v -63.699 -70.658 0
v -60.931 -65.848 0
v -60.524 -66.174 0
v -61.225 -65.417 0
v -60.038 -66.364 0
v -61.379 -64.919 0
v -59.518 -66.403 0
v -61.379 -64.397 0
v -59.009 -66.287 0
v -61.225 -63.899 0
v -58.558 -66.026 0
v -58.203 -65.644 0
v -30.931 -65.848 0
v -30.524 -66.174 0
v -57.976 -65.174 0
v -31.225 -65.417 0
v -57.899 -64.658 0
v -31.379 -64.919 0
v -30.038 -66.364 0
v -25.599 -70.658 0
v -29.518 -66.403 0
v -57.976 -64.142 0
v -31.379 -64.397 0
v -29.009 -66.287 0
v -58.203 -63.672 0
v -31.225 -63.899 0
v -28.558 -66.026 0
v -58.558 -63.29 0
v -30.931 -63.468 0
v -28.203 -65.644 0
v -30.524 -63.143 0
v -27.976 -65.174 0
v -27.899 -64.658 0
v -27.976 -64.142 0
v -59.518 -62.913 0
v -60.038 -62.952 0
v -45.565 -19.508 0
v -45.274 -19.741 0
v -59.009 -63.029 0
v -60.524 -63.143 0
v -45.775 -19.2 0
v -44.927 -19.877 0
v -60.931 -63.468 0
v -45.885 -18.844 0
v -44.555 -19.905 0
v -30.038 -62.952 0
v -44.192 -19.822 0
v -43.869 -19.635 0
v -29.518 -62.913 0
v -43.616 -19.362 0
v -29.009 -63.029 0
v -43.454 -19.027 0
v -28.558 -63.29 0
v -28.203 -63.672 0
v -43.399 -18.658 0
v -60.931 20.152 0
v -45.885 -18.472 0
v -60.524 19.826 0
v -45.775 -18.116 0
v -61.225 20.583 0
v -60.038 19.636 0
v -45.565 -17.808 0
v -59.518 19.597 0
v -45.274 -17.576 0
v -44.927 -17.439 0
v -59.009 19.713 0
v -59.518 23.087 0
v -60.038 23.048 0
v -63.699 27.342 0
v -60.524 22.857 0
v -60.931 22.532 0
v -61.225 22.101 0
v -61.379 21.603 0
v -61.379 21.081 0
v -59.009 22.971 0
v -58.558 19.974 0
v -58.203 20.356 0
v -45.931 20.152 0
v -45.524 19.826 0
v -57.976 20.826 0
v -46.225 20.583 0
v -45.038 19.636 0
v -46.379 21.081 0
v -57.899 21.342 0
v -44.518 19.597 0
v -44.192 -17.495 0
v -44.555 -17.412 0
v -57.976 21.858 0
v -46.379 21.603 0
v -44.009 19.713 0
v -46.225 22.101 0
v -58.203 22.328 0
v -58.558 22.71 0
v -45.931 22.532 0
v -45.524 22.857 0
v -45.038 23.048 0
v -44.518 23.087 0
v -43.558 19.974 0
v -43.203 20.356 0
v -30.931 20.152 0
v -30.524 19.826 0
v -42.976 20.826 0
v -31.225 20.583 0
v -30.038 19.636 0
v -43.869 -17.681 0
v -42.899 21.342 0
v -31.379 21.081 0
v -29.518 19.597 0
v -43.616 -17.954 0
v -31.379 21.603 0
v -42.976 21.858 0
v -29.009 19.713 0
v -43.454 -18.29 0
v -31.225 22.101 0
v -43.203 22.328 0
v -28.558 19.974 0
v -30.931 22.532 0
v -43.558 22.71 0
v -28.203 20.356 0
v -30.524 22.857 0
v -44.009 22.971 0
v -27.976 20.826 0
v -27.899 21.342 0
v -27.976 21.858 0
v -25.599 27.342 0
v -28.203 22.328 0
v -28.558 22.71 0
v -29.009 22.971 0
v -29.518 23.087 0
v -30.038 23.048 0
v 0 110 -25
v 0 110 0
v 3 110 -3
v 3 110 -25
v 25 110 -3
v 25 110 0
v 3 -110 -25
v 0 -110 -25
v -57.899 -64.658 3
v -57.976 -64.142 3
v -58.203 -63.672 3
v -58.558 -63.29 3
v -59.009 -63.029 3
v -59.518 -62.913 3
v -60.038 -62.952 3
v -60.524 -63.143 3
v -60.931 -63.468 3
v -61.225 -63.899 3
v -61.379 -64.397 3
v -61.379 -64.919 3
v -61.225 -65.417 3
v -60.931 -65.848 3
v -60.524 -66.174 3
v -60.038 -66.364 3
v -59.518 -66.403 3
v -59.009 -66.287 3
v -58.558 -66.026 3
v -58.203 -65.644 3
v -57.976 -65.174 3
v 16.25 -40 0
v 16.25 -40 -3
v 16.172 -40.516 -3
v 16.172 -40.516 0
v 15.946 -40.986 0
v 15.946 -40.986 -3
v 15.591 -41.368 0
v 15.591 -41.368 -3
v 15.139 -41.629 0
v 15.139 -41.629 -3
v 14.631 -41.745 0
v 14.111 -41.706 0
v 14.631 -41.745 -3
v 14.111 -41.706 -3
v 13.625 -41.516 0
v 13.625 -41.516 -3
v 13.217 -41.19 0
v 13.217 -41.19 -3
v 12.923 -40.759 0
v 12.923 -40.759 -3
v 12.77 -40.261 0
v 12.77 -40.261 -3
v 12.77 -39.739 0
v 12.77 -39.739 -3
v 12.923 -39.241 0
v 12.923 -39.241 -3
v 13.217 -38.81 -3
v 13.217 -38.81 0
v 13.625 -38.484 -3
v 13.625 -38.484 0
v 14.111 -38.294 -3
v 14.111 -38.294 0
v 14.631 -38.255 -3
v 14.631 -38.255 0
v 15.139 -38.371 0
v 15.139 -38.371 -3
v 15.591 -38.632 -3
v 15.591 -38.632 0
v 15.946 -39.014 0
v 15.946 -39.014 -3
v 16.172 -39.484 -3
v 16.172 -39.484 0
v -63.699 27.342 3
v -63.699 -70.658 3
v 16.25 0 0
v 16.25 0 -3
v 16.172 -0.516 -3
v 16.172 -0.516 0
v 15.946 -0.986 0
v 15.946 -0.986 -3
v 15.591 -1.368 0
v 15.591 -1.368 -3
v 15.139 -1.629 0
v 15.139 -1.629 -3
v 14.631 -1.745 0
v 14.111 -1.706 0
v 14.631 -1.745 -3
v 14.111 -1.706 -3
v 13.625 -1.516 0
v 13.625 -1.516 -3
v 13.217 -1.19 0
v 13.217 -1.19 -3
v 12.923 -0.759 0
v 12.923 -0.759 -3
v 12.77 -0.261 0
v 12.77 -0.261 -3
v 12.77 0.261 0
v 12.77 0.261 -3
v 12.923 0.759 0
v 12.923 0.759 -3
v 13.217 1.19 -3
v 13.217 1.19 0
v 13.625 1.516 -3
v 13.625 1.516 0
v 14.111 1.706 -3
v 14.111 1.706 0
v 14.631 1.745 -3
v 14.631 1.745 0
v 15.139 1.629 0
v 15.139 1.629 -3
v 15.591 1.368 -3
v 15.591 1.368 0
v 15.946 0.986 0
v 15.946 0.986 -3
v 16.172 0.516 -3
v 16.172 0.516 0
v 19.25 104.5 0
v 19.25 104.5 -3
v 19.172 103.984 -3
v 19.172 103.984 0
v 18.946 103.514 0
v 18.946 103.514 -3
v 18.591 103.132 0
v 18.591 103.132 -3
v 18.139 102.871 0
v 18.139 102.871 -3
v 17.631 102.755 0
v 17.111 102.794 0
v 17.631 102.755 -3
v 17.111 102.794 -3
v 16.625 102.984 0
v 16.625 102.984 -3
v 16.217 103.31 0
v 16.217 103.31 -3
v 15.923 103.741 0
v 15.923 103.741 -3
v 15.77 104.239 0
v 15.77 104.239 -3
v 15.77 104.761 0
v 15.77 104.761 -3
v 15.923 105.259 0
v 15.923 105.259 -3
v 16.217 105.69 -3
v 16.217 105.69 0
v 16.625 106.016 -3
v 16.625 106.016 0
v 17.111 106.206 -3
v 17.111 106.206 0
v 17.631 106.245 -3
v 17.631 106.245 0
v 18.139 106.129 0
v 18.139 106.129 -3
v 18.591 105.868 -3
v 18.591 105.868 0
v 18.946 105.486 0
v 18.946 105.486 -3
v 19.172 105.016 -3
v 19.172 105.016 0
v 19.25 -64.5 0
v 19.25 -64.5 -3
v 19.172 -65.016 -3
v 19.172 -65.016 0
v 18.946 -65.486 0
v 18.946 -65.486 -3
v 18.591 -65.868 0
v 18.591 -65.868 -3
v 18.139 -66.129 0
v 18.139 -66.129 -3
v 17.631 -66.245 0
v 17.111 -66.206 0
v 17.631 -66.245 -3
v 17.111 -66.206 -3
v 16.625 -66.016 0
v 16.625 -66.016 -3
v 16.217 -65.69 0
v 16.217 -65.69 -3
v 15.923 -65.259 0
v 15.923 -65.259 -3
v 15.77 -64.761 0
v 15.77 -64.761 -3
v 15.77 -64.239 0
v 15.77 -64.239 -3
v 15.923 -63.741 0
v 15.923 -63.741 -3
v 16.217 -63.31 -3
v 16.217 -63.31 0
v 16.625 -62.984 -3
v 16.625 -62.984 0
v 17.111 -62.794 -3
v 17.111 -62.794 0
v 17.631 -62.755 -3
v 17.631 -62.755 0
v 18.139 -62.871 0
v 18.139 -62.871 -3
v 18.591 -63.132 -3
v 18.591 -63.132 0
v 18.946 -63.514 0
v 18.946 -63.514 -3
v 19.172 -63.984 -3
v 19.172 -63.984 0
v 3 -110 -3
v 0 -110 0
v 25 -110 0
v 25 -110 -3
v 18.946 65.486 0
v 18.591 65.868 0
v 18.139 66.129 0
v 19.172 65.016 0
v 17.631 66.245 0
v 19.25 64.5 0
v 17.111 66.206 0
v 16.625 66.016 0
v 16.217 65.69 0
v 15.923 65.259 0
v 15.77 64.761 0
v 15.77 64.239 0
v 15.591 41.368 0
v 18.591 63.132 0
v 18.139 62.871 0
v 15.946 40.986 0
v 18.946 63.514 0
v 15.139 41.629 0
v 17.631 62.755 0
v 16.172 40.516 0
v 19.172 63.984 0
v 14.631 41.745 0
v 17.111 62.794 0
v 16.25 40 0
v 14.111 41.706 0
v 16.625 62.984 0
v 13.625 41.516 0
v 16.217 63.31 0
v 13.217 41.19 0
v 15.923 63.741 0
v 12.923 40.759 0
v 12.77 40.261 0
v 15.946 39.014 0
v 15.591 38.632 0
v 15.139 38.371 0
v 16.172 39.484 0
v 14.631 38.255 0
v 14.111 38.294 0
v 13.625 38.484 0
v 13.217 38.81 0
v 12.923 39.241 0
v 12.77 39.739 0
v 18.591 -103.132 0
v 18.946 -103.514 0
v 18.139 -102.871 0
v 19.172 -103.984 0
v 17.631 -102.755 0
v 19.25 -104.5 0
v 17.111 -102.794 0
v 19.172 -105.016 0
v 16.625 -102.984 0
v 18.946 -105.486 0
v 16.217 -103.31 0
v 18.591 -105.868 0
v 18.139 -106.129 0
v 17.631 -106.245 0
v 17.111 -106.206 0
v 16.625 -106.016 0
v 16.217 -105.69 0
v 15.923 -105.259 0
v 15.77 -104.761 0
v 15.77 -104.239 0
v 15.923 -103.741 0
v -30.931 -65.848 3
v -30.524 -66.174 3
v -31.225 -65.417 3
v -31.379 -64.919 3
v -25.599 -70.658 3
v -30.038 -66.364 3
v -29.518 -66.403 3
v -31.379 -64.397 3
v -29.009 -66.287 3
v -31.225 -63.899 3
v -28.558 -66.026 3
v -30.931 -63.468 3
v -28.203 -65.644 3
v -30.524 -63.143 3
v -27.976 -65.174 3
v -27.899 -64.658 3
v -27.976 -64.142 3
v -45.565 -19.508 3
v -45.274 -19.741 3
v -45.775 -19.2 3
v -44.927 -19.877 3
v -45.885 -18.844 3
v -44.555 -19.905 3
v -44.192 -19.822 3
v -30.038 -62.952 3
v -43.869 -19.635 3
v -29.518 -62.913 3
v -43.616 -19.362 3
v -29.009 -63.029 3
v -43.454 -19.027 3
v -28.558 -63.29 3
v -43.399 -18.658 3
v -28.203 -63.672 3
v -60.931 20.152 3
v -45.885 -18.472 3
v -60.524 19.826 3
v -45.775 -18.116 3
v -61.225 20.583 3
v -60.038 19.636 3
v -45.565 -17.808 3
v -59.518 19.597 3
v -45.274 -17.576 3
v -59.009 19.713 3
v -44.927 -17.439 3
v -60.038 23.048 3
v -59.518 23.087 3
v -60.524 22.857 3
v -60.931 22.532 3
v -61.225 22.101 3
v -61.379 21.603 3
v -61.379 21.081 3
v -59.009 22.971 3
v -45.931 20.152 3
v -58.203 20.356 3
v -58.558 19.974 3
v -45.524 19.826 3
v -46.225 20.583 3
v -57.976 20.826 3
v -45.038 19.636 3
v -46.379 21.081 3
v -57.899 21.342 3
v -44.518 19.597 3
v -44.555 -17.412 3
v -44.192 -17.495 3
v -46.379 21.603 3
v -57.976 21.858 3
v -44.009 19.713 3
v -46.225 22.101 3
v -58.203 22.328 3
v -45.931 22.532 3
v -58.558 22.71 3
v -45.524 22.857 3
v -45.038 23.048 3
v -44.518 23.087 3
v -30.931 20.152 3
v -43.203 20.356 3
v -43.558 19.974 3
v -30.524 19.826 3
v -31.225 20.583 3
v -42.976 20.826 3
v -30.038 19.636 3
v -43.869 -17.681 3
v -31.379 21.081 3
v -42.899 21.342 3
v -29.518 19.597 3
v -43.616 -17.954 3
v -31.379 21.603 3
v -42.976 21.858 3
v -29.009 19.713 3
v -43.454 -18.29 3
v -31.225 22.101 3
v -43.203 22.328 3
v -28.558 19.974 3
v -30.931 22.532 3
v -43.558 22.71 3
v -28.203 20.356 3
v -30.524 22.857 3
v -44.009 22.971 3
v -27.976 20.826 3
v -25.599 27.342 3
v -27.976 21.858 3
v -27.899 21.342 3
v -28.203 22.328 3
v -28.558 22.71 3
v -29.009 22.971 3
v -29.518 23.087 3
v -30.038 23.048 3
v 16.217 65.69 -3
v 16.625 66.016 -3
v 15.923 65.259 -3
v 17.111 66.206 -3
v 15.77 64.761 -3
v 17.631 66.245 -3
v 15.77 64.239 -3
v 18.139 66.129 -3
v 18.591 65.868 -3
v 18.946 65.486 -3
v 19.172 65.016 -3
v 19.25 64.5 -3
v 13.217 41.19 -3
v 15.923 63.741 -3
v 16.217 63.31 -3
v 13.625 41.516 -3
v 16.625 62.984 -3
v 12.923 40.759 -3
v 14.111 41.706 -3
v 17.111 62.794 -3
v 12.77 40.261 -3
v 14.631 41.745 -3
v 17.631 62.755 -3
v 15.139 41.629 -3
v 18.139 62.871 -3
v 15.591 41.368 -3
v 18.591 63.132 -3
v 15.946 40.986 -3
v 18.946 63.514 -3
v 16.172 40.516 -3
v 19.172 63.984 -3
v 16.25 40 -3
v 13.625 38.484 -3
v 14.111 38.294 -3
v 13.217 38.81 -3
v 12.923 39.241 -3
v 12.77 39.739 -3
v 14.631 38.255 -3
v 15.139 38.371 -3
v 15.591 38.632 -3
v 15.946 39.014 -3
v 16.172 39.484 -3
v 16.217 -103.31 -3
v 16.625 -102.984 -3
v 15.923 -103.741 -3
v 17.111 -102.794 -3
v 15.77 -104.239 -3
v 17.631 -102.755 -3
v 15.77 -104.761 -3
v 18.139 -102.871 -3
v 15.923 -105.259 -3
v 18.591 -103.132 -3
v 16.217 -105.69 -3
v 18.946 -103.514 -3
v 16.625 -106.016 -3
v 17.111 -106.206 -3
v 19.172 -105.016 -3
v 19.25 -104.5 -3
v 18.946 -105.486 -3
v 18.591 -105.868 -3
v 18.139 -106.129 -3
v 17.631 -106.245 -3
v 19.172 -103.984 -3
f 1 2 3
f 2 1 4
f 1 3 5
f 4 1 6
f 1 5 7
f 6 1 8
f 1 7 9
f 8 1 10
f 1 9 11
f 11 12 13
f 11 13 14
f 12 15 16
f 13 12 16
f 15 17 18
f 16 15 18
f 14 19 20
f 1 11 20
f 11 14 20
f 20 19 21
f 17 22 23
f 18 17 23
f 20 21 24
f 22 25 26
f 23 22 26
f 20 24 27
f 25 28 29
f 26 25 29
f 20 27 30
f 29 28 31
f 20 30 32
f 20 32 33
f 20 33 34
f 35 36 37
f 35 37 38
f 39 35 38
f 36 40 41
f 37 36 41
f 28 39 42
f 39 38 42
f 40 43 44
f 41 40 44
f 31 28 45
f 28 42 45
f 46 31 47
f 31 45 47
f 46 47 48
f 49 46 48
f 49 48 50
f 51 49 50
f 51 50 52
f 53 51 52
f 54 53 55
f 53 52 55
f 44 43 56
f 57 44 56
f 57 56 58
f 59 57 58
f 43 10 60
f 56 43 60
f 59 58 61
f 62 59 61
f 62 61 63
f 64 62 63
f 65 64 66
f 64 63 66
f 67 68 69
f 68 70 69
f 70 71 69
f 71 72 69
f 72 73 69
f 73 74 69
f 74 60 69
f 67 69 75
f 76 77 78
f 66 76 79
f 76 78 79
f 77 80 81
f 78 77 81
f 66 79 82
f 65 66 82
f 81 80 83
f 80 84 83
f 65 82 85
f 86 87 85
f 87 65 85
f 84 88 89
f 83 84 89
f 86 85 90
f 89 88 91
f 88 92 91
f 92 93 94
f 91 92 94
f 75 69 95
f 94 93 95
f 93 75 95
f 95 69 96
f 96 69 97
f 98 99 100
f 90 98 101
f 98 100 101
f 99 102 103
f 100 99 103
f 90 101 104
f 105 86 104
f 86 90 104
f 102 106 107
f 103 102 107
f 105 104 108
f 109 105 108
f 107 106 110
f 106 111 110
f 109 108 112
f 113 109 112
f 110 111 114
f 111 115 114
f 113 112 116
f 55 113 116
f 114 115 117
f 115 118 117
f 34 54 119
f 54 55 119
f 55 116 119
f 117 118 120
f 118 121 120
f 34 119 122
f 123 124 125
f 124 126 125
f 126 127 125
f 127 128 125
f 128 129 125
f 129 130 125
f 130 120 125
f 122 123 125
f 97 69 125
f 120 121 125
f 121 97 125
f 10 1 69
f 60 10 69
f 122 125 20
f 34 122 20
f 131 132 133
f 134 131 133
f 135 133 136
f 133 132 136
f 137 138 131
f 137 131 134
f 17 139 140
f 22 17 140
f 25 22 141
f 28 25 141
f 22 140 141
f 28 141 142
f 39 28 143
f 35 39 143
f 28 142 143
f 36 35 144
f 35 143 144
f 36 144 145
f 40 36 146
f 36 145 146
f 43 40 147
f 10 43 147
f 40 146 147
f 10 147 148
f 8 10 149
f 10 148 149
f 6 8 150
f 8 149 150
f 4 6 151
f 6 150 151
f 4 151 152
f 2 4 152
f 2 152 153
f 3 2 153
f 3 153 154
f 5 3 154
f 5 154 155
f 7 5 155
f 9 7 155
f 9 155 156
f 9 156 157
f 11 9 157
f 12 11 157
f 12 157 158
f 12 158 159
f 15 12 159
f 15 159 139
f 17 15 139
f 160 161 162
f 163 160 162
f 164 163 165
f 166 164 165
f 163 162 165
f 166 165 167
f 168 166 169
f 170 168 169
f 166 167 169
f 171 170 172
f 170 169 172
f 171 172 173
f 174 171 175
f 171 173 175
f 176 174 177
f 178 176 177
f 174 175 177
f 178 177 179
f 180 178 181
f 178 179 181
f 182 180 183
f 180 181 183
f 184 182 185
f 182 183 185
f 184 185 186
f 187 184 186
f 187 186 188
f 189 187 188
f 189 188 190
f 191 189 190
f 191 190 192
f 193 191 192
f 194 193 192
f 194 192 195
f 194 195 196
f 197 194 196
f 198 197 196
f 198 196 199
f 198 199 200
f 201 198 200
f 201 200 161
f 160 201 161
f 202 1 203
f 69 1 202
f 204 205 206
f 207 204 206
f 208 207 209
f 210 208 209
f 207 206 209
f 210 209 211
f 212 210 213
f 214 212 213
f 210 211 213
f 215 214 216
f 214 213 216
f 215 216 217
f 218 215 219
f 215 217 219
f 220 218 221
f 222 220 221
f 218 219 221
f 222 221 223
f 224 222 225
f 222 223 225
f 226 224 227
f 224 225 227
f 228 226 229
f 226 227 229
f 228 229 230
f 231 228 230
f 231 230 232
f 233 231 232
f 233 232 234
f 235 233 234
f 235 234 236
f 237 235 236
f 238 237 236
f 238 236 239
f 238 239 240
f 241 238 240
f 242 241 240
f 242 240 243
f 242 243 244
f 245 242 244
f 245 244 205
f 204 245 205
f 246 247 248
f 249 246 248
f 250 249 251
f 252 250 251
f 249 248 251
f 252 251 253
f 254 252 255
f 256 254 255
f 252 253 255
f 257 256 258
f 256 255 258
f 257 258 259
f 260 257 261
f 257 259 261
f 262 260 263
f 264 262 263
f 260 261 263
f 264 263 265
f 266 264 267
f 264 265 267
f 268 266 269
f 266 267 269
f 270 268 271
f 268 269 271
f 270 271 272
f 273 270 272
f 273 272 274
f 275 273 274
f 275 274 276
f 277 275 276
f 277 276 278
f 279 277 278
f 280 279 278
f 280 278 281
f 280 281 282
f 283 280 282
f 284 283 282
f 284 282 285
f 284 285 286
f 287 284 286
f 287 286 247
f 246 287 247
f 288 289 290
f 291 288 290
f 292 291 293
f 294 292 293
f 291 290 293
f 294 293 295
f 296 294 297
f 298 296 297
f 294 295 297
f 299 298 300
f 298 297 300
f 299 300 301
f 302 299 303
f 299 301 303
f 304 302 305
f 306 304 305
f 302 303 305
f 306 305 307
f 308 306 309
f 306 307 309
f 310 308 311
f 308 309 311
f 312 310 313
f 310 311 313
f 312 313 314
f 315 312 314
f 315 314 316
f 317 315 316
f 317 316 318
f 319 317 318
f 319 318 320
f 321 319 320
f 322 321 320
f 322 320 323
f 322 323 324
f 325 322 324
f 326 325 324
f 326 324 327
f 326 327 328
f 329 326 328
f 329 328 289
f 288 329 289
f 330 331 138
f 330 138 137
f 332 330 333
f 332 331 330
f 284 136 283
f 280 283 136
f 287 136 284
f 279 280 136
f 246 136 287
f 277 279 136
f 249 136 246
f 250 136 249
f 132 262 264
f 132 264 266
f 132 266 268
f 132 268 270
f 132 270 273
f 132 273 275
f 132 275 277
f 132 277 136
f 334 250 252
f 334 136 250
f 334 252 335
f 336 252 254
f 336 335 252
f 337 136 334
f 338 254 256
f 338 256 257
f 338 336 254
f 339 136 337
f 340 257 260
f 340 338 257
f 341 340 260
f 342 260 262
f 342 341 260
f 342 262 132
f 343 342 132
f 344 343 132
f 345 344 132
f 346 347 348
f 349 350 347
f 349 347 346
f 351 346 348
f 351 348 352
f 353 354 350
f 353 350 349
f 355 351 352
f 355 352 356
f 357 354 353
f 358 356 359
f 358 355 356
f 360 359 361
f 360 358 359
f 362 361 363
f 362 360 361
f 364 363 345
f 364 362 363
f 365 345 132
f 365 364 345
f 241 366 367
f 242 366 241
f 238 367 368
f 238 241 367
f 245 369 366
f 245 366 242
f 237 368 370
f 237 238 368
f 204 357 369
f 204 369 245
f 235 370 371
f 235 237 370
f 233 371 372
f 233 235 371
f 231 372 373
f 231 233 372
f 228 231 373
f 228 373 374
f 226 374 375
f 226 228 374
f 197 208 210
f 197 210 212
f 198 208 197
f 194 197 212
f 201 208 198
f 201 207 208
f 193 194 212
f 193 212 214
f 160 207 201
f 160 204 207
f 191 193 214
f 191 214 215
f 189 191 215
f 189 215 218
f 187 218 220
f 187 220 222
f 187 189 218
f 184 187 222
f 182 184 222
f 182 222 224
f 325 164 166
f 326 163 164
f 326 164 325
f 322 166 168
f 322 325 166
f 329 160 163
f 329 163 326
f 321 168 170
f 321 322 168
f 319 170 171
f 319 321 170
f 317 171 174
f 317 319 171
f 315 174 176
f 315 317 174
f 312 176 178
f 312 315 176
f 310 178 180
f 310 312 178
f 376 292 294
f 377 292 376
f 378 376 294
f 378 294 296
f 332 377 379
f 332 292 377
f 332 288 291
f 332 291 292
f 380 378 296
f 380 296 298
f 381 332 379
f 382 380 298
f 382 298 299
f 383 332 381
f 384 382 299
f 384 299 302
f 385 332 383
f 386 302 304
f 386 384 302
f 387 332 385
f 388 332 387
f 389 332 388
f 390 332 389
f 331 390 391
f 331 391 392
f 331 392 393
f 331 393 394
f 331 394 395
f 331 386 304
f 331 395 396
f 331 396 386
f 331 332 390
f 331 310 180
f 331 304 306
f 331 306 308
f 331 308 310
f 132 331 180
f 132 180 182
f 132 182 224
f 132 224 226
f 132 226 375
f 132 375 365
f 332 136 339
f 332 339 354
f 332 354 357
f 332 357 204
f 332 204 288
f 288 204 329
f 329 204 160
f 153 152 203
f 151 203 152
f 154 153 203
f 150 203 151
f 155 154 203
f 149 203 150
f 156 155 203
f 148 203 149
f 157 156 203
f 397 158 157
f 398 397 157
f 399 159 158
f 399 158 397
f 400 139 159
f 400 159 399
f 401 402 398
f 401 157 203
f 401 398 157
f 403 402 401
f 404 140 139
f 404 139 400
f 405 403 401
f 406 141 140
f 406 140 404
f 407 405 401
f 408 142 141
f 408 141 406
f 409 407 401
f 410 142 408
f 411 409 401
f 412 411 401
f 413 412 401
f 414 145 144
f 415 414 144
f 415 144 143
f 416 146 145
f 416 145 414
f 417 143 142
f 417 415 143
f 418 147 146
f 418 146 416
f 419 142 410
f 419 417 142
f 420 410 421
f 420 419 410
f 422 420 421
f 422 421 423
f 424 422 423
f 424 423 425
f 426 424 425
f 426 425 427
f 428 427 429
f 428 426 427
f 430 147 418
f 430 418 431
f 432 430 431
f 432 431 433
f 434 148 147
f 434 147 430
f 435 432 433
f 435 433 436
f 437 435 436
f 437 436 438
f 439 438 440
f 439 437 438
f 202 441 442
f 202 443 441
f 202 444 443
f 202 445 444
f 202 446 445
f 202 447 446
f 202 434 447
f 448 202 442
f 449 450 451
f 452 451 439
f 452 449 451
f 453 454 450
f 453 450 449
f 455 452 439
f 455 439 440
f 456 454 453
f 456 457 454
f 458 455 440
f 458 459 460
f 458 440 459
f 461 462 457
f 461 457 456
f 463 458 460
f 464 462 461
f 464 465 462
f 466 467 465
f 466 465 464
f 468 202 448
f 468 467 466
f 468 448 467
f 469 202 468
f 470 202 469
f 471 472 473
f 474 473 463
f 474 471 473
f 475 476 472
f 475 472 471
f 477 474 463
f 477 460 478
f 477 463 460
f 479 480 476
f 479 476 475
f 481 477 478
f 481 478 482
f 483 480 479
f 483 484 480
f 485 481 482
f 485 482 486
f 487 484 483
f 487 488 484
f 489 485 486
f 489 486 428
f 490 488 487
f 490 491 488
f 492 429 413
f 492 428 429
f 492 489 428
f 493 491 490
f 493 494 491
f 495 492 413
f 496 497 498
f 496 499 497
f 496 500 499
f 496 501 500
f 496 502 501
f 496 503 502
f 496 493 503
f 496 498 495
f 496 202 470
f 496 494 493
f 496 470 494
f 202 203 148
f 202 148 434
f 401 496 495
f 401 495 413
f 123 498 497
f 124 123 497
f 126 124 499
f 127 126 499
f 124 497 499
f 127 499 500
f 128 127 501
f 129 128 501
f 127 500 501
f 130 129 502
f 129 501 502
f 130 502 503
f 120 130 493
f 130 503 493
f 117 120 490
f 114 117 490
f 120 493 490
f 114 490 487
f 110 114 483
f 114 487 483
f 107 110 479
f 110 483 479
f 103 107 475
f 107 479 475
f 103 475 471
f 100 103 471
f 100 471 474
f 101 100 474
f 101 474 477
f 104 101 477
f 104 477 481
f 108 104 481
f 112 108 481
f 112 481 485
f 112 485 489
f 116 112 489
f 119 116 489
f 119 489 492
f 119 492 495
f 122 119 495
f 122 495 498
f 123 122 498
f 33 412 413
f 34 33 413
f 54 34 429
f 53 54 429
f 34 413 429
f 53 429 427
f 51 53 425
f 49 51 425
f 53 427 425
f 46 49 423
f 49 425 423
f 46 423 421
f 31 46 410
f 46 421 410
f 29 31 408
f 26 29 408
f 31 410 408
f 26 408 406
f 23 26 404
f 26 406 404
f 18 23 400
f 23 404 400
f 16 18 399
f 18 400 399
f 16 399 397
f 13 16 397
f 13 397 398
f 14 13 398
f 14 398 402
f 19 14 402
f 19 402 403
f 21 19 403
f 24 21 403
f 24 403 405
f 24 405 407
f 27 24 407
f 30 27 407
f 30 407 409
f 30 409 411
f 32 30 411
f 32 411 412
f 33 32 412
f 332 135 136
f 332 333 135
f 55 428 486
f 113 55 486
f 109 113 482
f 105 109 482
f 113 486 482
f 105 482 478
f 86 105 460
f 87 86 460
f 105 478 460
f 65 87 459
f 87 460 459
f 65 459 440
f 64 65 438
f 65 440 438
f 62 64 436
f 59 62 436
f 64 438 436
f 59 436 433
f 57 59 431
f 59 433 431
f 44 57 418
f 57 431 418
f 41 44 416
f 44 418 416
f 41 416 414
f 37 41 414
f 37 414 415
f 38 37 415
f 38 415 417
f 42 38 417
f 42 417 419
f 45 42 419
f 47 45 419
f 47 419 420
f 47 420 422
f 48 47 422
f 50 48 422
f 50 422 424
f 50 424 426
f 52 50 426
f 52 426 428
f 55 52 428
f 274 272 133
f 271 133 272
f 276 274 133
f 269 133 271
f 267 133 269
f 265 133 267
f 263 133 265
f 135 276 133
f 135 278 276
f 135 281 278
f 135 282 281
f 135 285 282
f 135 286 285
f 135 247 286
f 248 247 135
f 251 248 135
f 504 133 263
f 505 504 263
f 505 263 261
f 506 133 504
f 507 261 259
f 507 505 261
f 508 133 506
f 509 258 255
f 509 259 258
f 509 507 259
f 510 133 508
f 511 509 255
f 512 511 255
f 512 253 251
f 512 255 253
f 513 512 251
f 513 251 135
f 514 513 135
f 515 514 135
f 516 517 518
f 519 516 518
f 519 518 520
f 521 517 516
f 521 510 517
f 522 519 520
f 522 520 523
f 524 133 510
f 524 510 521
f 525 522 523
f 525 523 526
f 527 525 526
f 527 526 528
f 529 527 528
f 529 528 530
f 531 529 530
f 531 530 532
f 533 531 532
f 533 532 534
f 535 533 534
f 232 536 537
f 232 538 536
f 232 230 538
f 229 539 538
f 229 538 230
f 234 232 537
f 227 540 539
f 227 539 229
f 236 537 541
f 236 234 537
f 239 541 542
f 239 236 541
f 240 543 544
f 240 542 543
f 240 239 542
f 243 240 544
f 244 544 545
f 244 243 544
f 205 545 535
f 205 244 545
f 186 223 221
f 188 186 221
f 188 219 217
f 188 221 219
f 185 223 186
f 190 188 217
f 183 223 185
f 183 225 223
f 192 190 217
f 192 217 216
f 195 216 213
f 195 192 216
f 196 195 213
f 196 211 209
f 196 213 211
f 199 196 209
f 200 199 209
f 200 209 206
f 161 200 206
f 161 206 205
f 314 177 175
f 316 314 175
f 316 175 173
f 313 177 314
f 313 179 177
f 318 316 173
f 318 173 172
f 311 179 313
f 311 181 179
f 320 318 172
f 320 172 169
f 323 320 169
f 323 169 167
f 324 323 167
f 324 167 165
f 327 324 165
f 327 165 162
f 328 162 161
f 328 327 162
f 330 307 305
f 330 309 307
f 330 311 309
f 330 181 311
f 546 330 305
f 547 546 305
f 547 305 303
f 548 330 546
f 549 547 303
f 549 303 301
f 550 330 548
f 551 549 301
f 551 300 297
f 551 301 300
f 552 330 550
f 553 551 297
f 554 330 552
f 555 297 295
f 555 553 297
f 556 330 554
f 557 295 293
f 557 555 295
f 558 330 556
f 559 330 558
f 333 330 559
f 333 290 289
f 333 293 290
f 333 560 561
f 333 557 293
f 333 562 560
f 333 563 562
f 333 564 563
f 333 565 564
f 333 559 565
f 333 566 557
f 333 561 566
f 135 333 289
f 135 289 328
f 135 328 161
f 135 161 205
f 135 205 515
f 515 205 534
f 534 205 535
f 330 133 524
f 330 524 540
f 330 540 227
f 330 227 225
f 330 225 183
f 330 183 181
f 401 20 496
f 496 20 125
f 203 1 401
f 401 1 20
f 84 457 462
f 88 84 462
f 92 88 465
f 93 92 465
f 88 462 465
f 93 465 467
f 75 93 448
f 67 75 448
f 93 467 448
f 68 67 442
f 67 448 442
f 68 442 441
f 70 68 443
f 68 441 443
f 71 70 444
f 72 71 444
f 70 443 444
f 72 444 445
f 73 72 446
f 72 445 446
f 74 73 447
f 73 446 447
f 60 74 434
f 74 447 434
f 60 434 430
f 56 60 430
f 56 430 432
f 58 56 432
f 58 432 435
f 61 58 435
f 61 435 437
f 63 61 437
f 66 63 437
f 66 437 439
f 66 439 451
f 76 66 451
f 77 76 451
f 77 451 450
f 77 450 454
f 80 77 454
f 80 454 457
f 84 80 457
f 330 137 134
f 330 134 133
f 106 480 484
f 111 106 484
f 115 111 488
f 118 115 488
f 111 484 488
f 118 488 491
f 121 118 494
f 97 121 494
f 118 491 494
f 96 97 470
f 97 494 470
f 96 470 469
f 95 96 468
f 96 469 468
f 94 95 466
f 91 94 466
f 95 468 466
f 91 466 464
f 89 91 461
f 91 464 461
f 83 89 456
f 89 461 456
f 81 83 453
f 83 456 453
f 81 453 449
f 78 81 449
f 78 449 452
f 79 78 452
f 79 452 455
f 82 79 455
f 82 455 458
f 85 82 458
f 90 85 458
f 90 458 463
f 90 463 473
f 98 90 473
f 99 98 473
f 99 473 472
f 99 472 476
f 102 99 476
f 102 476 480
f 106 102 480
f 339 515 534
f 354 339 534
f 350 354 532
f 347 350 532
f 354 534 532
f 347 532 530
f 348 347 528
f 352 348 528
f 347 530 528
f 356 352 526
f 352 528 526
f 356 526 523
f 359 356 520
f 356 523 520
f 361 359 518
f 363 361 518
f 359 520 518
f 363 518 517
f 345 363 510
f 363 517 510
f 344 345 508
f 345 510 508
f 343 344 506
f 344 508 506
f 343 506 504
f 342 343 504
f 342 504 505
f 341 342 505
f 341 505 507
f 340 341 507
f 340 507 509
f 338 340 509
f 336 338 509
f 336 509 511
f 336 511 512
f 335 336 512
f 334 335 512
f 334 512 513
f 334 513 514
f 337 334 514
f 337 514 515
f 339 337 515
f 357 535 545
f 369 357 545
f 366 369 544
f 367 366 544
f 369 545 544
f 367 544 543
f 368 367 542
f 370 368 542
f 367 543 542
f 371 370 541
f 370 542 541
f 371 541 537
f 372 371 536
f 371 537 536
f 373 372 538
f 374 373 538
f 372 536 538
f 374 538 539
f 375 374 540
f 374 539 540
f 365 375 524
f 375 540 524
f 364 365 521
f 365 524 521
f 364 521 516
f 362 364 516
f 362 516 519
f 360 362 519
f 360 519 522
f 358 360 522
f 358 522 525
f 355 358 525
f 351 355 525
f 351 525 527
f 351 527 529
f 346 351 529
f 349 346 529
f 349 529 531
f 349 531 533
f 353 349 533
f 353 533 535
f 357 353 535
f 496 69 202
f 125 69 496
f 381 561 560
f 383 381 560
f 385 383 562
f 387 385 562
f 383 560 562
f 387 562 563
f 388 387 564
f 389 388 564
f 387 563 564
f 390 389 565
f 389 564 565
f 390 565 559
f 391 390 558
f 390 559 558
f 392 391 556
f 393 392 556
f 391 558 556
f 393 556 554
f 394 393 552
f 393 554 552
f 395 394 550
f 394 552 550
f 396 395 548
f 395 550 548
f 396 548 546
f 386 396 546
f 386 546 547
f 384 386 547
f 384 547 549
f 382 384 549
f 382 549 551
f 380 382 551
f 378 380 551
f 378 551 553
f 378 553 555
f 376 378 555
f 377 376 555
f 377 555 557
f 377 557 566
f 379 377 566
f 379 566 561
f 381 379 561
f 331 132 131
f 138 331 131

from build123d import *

# Parameters (mm, degrees)
F1_DEPTH = 110
F2_R     = 1.75
F3_DEPTH = 3.001
F4_W     = 38.1
F4_H     = 98
F5_DEPTH = 3
F6_R     = 1.75
F7_DEPTH = 6.001
F8_R     = 1.75
F8_R_2   = 1.25
F9_DEPTH = 28.001


with BuildPart() as f1:
    # F0 (on Front) → F1 (new body, symmetric)
    with BuildSketch(Plane.XZ):
        Polygon((25, 0), (0, 0), (0, -25), (3, -25), (3, -3), (25, -3), align=None)
    extrude(amount=F1_DEPTH, both=True)

    # F2 (on face) → F3 (cut, through all)
    with BuildSketch(Plane(origin=(0, 0, -3), x_dir=(1, 0, 0), z_dir=(0, 0, -1))):
        with Locations((17.5, 104.5)):
            Circle(F2_R)
        with Locations((17.5, -104.5)):
            Circle(F2_R)
        with Locations((17.5, 64.5)):
            Circle(F2_R)
        with Locations((17.5, -64.5)):
            Circle(F2_R)
    extrude(amount=-F3_DEPTH, mode=Mode.SUBTRACT)

    # F6 (on face) → F7 (cut, through all)
    with BuildSketch(Plane(origin=(0, 0, -3), x_dir=(1, 0, 0), z_dir=(0, 0, -1))):
        with Locations((14.5, 40)):
            Circle(F6_R)
        with Locations((14.5, 0)):
            Circle(F6_R)
        with Locations((14.5, -40)):
            Circle(F6_R)
    extrude(amount=-F7_DEPTH, mode=Mode.SUBTRACT)


with BuildPart() as f5:
    # F4 (on Top) → F5 (new body)
    with BuildSketch(Plane.XY):
        with Locations((-44.648656, -21.658122)):
            Rectangle(F4_W, F4_H)
    extrude(amount=F5_DEPTH)

    # F8 (on face) → F9 (cut, through all)
    with BuildSketch(Plane.XY.offset(3)):
        with Locations((-59.648656, 21.341878)):
            Circle(F8_R)
        with Locations((-29.648656, 21.341878)):
            Circle(F8_R)
        with Locations((-59.648656, -64.658122)):
            Circle(F8_R)
        with Locations((-29.648656, -64.658122)):
            Circle(F8_R)
        with Locations((-44.648656, 21.341878)):
            Circle(F8_R)
        with Locations((-44.648656, -18.658122)):
            Circle(F8_R_2)
    extrude(amount=-F9_DEPTH, mode=Mode.SUBTRACT)


solid = Compound([f1.part, f5.part])
